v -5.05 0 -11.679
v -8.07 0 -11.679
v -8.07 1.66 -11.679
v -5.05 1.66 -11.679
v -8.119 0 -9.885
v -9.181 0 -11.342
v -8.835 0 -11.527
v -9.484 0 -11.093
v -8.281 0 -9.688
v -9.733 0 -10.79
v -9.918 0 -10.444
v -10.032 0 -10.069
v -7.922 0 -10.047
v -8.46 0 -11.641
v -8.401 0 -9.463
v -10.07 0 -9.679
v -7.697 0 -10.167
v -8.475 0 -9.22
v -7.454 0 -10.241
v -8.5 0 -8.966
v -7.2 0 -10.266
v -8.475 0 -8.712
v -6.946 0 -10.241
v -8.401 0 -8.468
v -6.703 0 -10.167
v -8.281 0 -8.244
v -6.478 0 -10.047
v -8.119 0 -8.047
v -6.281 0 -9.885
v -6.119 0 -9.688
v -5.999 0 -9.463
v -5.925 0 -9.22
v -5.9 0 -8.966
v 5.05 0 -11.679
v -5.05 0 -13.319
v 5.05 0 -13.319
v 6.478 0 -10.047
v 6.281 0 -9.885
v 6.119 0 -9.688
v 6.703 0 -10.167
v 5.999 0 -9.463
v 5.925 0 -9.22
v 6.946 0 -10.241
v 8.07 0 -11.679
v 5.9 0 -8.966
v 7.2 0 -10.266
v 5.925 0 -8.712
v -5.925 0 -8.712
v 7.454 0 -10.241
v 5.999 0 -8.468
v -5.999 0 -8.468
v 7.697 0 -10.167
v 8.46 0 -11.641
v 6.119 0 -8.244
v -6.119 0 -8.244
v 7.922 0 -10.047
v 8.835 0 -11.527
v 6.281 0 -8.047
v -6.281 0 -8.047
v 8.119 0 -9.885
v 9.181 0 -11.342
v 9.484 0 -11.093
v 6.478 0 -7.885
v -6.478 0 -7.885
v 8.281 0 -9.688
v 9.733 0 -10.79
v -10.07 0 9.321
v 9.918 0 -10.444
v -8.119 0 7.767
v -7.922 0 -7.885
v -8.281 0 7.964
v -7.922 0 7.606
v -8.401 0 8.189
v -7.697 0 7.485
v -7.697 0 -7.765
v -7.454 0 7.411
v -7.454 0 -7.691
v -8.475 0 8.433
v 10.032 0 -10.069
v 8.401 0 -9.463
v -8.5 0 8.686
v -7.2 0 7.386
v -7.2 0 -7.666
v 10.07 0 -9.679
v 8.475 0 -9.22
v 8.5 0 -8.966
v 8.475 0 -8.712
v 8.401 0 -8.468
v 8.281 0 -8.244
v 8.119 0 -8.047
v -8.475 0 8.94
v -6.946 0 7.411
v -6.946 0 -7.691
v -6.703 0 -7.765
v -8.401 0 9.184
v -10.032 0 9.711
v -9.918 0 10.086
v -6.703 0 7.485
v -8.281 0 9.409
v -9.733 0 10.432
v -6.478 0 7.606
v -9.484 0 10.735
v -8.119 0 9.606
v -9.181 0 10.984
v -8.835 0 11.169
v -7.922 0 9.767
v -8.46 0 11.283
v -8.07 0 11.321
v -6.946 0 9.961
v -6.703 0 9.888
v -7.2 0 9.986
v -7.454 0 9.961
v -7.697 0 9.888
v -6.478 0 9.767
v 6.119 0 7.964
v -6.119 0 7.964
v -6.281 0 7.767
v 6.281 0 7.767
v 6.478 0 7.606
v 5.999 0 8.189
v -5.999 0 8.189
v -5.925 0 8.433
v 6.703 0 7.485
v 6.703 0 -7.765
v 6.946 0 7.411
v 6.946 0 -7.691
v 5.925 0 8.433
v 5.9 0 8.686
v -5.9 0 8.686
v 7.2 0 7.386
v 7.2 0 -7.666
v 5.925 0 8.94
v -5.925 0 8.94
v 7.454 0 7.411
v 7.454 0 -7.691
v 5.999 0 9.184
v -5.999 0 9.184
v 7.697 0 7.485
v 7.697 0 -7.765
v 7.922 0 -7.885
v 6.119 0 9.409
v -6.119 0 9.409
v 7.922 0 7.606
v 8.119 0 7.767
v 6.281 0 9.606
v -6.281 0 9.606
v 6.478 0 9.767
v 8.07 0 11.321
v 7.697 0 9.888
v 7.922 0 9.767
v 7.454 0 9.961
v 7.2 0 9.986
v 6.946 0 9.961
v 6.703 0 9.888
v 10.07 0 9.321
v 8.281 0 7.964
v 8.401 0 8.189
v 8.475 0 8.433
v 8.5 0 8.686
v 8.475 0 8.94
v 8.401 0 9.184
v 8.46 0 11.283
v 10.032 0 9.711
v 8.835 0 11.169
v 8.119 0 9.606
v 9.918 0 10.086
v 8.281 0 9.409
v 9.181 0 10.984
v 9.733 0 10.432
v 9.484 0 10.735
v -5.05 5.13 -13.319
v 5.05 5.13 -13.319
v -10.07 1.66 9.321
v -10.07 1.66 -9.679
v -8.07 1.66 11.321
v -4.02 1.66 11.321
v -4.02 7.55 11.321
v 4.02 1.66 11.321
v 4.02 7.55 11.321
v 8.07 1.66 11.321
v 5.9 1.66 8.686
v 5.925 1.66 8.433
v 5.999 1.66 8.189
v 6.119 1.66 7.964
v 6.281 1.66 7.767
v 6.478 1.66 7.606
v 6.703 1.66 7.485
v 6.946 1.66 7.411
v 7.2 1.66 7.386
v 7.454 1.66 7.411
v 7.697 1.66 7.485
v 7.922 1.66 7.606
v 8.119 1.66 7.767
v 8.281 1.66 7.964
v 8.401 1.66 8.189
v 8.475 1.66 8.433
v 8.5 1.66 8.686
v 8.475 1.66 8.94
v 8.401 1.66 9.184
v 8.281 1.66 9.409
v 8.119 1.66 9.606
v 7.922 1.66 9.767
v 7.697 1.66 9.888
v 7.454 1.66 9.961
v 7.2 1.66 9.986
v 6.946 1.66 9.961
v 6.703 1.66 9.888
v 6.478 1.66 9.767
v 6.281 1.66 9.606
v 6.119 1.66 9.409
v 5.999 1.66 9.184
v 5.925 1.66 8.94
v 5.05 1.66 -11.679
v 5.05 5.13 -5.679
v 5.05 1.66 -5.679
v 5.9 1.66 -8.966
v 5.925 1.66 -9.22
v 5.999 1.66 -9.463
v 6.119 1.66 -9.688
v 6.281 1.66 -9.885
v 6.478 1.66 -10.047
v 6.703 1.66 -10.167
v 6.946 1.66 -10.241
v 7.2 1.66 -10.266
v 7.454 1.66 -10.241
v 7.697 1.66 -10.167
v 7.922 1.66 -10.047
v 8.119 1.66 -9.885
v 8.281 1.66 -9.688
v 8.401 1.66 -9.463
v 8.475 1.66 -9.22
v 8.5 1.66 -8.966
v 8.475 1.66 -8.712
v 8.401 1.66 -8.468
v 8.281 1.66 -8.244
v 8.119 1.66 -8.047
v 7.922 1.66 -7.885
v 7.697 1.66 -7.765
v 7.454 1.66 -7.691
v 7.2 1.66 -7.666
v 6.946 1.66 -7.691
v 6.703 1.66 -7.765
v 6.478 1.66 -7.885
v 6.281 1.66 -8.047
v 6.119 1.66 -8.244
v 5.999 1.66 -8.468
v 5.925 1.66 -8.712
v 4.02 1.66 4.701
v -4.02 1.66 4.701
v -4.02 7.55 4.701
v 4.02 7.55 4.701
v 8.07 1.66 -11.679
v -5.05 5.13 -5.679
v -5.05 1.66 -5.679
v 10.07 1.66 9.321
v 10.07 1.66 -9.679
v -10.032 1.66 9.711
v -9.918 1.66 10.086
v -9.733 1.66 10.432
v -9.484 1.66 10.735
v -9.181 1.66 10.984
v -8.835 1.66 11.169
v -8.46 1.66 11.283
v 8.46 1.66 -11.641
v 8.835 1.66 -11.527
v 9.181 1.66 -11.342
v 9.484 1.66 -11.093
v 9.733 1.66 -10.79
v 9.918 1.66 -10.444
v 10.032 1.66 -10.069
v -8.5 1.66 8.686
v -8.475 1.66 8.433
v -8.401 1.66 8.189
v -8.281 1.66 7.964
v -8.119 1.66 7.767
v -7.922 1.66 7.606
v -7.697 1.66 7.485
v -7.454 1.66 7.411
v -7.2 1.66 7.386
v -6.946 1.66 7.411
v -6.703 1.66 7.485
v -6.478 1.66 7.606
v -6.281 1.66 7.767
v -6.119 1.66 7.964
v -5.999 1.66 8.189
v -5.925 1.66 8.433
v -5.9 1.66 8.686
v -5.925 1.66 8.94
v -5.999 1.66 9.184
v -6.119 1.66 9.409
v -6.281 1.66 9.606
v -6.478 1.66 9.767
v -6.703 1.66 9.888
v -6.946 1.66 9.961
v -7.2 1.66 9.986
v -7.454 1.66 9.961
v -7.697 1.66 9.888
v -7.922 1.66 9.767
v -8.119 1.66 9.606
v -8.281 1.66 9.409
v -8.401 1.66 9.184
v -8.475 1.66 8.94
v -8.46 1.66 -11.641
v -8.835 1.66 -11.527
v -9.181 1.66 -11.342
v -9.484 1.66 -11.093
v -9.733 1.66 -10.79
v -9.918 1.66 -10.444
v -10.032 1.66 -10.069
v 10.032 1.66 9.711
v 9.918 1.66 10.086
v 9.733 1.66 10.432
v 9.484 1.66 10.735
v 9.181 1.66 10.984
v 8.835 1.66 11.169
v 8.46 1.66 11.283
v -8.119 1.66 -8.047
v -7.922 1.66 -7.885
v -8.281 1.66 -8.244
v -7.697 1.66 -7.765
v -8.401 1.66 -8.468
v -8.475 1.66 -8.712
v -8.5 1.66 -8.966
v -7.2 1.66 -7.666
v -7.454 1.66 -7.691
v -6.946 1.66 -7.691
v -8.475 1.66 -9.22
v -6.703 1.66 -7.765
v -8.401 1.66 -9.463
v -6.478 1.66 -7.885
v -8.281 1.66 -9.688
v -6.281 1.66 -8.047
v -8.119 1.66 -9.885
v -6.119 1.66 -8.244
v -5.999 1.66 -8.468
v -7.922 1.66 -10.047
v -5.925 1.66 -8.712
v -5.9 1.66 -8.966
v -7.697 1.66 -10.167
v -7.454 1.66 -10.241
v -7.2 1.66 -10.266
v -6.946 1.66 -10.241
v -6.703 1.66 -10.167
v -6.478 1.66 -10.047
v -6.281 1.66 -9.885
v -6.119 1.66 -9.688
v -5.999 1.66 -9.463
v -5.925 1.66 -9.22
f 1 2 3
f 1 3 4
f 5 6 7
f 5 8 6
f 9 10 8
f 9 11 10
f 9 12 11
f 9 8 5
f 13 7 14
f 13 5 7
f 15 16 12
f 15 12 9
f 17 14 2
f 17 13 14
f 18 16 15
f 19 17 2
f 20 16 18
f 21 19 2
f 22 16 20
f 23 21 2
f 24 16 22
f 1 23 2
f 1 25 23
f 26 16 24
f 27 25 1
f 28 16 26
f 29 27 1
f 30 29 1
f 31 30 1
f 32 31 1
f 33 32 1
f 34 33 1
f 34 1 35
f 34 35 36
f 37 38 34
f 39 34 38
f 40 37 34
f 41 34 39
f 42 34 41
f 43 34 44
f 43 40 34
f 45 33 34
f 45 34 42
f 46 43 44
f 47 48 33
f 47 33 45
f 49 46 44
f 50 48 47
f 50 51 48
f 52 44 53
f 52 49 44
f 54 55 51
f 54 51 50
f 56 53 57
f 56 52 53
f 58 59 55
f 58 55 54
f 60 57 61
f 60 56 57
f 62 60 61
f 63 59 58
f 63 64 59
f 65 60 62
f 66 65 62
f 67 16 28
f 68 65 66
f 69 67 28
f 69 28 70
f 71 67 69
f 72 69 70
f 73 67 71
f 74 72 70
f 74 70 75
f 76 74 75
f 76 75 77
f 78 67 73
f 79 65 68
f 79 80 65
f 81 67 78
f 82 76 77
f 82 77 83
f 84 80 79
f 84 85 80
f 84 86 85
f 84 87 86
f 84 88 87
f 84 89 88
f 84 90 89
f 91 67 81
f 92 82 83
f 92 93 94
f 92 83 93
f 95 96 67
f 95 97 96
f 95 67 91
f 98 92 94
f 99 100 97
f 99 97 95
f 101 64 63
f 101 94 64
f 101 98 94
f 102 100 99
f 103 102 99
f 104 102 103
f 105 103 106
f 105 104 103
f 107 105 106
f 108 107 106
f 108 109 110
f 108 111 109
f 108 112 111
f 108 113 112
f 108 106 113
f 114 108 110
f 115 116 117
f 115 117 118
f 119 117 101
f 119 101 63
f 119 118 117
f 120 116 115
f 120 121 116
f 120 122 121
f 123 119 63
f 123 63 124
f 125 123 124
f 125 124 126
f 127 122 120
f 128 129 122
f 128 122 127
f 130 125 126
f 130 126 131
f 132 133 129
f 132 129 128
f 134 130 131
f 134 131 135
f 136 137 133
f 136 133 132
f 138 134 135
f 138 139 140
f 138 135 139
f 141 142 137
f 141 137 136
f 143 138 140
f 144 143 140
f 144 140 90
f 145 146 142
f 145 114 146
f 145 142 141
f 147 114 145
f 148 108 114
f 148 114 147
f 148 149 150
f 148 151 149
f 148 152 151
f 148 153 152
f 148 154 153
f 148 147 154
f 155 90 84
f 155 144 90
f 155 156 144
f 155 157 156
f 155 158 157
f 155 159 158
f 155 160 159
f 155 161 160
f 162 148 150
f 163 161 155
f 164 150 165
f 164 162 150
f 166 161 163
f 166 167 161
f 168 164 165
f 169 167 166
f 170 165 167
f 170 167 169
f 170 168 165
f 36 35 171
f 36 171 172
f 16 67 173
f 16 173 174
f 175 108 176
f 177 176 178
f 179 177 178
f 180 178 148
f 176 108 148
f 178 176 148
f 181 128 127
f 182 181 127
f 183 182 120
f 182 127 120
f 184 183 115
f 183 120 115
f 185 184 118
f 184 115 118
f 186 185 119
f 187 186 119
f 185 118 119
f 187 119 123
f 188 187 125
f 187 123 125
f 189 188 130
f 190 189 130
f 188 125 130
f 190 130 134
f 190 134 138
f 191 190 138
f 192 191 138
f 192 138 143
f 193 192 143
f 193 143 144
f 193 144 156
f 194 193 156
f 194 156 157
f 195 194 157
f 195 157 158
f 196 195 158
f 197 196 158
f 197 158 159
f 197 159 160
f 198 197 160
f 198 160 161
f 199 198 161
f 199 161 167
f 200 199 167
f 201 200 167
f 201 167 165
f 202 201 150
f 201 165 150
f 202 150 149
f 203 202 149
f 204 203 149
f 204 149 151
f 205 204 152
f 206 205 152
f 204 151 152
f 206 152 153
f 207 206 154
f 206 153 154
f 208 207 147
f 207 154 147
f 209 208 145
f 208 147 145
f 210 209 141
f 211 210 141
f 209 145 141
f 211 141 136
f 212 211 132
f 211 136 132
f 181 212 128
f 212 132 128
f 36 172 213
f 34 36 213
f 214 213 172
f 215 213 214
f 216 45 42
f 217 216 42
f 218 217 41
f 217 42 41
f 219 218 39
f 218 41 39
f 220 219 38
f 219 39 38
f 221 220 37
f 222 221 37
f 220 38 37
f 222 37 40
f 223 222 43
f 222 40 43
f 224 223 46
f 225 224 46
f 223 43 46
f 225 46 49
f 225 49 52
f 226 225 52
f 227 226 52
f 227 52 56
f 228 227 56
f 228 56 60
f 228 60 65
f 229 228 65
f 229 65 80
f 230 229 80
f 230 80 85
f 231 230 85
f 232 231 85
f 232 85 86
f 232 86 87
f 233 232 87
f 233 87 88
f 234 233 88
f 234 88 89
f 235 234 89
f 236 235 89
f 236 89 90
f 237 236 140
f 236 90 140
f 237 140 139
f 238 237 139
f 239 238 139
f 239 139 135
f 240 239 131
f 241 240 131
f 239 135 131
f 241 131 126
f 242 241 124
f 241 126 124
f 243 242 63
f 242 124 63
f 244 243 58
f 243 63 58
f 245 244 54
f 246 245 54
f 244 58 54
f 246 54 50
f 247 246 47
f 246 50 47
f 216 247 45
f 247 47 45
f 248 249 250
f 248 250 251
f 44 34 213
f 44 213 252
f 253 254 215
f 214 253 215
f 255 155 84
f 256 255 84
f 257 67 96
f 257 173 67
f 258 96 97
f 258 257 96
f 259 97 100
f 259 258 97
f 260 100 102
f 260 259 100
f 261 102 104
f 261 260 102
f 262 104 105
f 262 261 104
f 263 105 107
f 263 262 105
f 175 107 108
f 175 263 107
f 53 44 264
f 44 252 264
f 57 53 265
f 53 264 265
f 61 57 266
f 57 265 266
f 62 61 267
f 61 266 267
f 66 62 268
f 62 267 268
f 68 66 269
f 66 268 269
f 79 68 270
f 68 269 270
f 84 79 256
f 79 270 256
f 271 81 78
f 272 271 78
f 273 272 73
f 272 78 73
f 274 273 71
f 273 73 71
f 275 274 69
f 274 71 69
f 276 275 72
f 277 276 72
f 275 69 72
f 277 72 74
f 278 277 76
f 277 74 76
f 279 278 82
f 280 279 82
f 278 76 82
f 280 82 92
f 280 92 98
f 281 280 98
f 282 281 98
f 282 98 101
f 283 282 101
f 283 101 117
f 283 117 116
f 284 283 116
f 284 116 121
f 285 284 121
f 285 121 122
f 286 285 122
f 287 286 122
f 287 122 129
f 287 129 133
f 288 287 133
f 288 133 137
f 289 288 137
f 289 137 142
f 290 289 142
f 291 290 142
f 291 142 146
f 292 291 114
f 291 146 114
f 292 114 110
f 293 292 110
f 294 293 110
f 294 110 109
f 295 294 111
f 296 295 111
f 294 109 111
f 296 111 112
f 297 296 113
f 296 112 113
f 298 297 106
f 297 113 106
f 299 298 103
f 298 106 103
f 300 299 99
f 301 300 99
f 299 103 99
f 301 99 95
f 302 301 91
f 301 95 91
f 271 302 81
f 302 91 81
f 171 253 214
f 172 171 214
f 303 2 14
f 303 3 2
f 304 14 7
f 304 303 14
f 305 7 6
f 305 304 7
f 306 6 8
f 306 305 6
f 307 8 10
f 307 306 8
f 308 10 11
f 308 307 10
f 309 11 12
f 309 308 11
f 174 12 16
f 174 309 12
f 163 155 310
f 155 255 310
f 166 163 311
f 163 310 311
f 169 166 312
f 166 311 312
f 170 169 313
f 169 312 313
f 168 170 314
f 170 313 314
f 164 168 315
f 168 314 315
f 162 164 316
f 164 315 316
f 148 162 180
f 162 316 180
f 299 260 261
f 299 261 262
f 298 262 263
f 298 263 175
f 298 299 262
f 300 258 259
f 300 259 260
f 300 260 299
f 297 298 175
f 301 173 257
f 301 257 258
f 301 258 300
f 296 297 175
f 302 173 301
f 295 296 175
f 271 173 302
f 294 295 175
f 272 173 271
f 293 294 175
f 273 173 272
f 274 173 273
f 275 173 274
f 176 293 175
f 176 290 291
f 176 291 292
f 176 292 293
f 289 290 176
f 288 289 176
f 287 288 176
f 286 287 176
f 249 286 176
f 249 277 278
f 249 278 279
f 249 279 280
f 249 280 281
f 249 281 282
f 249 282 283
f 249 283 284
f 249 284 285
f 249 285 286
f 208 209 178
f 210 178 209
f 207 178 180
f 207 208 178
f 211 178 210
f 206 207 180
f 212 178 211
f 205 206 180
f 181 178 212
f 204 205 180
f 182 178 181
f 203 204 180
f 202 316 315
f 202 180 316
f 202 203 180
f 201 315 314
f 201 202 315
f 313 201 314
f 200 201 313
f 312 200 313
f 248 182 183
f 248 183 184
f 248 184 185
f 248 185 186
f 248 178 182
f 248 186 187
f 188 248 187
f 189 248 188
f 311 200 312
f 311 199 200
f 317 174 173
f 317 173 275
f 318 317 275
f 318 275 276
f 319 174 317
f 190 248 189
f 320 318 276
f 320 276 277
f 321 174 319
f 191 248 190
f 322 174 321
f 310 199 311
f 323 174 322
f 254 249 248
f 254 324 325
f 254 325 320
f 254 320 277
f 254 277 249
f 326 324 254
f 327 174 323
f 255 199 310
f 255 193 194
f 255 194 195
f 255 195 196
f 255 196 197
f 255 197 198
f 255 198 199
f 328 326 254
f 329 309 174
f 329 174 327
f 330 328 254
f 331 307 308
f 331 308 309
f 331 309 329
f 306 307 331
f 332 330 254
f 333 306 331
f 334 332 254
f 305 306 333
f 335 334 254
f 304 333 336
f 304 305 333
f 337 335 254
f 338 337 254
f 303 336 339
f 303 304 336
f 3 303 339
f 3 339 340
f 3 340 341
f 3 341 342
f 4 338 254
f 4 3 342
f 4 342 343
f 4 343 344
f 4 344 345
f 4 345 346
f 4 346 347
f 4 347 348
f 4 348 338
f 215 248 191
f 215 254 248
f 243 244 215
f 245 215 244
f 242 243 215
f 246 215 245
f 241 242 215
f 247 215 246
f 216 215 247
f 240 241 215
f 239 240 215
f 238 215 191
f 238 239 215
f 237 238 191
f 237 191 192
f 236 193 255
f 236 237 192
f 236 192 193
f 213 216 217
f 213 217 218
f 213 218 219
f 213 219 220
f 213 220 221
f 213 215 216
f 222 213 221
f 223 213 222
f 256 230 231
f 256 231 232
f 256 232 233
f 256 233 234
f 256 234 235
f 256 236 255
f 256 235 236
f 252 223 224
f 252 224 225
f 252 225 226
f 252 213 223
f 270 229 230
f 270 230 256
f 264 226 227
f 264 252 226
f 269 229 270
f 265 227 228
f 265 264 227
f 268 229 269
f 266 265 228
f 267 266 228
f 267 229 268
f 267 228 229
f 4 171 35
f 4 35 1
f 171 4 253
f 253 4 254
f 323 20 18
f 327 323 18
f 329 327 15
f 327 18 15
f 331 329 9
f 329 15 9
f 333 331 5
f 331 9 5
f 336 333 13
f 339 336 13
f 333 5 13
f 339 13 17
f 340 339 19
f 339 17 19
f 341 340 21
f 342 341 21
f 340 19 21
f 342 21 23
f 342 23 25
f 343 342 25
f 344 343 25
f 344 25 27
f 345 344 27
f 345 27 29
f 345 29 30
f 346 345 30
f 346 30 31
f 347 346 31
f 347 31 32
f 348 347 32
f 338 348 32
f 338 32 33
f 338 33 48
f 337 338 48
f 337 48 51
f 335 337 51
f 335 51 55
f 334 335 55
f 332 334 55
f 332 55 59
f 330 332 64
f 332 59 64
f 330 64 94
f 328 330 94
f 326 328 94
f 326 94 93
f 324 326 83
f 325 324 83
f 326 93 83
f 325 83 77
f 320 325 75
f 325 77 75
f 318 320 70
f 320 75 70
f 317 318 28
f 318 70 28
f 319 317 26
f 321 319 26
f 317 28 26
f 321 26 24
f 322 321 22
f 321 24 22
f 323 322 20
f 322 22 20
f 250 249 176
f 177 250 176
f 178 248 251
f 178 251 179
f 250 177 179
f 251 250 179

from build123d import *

# Parameters (mm, degrees)
SKETCH1_W           = 20.14
SKETCH1_H           = 23
BOSS_EXTRUDE1_DEPTH = 1.66
SKETCH2_W           = 8.04
SKETCH2_H           = 6.62
BOSS_EXTRUDE2_DEPTH = 7.55
SKETCH3_W           = 10.1
SKETCH3_H           = 7.64
BOSS_EXTRUDE3_DEPTH = 5.13
FILLET1_R           = 2
HOLE1_D             = 2.6


with BuildPart() as part:
    # Sketch1 → Boss-Extrude1 (new body)
    with BuildSketch(Plane(origin=(0, 0, 0), x_dir=(1, 0, 0), z_dir=(0, 1, 0))):
        with Locations((0, 0.178988327)):
            Rectangle(SKETCH1_W, SKETCH1_H)
    extrude(amount=BOSS_EXTRUDE1_DEPTH)

    # Sketch2 → Boss-Extrude2 (add)
    with BuildSketch(Plane.XZ):
        with Locations((0, 8.011011673)):
            Rectangle(SKETCH2_W, SKETCH2_H)
    extrude(amount=-BOSS_EXTRUDE2_DEPTH)

    # Sketch3 → Boss-Extrude3 (add)
    with BuildSketch(Plane.XZ):
        with Locations((0, -9.498988327)):
            Rectangle(SKETCH3_W, SKETCH3_H)
    extrude(amount=-BOSS_EXTRUDE3_DEPTH)

    # Fillet1
    fillet1_edges = [part.edges().sort_by_distance(p)[0] for p in [
        (-10.07, 0.83, -11.678988327),
        (10.07, 0.83, -11.678988327),
        (10.07, 0.83, 11.321011673),
        (-10.07, 0.83, 11.321011673),
    ]]
    fillet(fillet1_edges, radius=FILLET1_R)

    # Hole1 (through all)
    with Locations(Plane(origin=(0, 1.66, 0), x_dir=(1, 0, 0), z_dir=(0, 1, 0))):
        with Locations((-7.2, 8.965942289), (7.2, 8.965942289), (7.2, -8.68646887), (-7.2, -8.68646887)):
            Hole(HOLE1_D / 2)


solid = part.part
